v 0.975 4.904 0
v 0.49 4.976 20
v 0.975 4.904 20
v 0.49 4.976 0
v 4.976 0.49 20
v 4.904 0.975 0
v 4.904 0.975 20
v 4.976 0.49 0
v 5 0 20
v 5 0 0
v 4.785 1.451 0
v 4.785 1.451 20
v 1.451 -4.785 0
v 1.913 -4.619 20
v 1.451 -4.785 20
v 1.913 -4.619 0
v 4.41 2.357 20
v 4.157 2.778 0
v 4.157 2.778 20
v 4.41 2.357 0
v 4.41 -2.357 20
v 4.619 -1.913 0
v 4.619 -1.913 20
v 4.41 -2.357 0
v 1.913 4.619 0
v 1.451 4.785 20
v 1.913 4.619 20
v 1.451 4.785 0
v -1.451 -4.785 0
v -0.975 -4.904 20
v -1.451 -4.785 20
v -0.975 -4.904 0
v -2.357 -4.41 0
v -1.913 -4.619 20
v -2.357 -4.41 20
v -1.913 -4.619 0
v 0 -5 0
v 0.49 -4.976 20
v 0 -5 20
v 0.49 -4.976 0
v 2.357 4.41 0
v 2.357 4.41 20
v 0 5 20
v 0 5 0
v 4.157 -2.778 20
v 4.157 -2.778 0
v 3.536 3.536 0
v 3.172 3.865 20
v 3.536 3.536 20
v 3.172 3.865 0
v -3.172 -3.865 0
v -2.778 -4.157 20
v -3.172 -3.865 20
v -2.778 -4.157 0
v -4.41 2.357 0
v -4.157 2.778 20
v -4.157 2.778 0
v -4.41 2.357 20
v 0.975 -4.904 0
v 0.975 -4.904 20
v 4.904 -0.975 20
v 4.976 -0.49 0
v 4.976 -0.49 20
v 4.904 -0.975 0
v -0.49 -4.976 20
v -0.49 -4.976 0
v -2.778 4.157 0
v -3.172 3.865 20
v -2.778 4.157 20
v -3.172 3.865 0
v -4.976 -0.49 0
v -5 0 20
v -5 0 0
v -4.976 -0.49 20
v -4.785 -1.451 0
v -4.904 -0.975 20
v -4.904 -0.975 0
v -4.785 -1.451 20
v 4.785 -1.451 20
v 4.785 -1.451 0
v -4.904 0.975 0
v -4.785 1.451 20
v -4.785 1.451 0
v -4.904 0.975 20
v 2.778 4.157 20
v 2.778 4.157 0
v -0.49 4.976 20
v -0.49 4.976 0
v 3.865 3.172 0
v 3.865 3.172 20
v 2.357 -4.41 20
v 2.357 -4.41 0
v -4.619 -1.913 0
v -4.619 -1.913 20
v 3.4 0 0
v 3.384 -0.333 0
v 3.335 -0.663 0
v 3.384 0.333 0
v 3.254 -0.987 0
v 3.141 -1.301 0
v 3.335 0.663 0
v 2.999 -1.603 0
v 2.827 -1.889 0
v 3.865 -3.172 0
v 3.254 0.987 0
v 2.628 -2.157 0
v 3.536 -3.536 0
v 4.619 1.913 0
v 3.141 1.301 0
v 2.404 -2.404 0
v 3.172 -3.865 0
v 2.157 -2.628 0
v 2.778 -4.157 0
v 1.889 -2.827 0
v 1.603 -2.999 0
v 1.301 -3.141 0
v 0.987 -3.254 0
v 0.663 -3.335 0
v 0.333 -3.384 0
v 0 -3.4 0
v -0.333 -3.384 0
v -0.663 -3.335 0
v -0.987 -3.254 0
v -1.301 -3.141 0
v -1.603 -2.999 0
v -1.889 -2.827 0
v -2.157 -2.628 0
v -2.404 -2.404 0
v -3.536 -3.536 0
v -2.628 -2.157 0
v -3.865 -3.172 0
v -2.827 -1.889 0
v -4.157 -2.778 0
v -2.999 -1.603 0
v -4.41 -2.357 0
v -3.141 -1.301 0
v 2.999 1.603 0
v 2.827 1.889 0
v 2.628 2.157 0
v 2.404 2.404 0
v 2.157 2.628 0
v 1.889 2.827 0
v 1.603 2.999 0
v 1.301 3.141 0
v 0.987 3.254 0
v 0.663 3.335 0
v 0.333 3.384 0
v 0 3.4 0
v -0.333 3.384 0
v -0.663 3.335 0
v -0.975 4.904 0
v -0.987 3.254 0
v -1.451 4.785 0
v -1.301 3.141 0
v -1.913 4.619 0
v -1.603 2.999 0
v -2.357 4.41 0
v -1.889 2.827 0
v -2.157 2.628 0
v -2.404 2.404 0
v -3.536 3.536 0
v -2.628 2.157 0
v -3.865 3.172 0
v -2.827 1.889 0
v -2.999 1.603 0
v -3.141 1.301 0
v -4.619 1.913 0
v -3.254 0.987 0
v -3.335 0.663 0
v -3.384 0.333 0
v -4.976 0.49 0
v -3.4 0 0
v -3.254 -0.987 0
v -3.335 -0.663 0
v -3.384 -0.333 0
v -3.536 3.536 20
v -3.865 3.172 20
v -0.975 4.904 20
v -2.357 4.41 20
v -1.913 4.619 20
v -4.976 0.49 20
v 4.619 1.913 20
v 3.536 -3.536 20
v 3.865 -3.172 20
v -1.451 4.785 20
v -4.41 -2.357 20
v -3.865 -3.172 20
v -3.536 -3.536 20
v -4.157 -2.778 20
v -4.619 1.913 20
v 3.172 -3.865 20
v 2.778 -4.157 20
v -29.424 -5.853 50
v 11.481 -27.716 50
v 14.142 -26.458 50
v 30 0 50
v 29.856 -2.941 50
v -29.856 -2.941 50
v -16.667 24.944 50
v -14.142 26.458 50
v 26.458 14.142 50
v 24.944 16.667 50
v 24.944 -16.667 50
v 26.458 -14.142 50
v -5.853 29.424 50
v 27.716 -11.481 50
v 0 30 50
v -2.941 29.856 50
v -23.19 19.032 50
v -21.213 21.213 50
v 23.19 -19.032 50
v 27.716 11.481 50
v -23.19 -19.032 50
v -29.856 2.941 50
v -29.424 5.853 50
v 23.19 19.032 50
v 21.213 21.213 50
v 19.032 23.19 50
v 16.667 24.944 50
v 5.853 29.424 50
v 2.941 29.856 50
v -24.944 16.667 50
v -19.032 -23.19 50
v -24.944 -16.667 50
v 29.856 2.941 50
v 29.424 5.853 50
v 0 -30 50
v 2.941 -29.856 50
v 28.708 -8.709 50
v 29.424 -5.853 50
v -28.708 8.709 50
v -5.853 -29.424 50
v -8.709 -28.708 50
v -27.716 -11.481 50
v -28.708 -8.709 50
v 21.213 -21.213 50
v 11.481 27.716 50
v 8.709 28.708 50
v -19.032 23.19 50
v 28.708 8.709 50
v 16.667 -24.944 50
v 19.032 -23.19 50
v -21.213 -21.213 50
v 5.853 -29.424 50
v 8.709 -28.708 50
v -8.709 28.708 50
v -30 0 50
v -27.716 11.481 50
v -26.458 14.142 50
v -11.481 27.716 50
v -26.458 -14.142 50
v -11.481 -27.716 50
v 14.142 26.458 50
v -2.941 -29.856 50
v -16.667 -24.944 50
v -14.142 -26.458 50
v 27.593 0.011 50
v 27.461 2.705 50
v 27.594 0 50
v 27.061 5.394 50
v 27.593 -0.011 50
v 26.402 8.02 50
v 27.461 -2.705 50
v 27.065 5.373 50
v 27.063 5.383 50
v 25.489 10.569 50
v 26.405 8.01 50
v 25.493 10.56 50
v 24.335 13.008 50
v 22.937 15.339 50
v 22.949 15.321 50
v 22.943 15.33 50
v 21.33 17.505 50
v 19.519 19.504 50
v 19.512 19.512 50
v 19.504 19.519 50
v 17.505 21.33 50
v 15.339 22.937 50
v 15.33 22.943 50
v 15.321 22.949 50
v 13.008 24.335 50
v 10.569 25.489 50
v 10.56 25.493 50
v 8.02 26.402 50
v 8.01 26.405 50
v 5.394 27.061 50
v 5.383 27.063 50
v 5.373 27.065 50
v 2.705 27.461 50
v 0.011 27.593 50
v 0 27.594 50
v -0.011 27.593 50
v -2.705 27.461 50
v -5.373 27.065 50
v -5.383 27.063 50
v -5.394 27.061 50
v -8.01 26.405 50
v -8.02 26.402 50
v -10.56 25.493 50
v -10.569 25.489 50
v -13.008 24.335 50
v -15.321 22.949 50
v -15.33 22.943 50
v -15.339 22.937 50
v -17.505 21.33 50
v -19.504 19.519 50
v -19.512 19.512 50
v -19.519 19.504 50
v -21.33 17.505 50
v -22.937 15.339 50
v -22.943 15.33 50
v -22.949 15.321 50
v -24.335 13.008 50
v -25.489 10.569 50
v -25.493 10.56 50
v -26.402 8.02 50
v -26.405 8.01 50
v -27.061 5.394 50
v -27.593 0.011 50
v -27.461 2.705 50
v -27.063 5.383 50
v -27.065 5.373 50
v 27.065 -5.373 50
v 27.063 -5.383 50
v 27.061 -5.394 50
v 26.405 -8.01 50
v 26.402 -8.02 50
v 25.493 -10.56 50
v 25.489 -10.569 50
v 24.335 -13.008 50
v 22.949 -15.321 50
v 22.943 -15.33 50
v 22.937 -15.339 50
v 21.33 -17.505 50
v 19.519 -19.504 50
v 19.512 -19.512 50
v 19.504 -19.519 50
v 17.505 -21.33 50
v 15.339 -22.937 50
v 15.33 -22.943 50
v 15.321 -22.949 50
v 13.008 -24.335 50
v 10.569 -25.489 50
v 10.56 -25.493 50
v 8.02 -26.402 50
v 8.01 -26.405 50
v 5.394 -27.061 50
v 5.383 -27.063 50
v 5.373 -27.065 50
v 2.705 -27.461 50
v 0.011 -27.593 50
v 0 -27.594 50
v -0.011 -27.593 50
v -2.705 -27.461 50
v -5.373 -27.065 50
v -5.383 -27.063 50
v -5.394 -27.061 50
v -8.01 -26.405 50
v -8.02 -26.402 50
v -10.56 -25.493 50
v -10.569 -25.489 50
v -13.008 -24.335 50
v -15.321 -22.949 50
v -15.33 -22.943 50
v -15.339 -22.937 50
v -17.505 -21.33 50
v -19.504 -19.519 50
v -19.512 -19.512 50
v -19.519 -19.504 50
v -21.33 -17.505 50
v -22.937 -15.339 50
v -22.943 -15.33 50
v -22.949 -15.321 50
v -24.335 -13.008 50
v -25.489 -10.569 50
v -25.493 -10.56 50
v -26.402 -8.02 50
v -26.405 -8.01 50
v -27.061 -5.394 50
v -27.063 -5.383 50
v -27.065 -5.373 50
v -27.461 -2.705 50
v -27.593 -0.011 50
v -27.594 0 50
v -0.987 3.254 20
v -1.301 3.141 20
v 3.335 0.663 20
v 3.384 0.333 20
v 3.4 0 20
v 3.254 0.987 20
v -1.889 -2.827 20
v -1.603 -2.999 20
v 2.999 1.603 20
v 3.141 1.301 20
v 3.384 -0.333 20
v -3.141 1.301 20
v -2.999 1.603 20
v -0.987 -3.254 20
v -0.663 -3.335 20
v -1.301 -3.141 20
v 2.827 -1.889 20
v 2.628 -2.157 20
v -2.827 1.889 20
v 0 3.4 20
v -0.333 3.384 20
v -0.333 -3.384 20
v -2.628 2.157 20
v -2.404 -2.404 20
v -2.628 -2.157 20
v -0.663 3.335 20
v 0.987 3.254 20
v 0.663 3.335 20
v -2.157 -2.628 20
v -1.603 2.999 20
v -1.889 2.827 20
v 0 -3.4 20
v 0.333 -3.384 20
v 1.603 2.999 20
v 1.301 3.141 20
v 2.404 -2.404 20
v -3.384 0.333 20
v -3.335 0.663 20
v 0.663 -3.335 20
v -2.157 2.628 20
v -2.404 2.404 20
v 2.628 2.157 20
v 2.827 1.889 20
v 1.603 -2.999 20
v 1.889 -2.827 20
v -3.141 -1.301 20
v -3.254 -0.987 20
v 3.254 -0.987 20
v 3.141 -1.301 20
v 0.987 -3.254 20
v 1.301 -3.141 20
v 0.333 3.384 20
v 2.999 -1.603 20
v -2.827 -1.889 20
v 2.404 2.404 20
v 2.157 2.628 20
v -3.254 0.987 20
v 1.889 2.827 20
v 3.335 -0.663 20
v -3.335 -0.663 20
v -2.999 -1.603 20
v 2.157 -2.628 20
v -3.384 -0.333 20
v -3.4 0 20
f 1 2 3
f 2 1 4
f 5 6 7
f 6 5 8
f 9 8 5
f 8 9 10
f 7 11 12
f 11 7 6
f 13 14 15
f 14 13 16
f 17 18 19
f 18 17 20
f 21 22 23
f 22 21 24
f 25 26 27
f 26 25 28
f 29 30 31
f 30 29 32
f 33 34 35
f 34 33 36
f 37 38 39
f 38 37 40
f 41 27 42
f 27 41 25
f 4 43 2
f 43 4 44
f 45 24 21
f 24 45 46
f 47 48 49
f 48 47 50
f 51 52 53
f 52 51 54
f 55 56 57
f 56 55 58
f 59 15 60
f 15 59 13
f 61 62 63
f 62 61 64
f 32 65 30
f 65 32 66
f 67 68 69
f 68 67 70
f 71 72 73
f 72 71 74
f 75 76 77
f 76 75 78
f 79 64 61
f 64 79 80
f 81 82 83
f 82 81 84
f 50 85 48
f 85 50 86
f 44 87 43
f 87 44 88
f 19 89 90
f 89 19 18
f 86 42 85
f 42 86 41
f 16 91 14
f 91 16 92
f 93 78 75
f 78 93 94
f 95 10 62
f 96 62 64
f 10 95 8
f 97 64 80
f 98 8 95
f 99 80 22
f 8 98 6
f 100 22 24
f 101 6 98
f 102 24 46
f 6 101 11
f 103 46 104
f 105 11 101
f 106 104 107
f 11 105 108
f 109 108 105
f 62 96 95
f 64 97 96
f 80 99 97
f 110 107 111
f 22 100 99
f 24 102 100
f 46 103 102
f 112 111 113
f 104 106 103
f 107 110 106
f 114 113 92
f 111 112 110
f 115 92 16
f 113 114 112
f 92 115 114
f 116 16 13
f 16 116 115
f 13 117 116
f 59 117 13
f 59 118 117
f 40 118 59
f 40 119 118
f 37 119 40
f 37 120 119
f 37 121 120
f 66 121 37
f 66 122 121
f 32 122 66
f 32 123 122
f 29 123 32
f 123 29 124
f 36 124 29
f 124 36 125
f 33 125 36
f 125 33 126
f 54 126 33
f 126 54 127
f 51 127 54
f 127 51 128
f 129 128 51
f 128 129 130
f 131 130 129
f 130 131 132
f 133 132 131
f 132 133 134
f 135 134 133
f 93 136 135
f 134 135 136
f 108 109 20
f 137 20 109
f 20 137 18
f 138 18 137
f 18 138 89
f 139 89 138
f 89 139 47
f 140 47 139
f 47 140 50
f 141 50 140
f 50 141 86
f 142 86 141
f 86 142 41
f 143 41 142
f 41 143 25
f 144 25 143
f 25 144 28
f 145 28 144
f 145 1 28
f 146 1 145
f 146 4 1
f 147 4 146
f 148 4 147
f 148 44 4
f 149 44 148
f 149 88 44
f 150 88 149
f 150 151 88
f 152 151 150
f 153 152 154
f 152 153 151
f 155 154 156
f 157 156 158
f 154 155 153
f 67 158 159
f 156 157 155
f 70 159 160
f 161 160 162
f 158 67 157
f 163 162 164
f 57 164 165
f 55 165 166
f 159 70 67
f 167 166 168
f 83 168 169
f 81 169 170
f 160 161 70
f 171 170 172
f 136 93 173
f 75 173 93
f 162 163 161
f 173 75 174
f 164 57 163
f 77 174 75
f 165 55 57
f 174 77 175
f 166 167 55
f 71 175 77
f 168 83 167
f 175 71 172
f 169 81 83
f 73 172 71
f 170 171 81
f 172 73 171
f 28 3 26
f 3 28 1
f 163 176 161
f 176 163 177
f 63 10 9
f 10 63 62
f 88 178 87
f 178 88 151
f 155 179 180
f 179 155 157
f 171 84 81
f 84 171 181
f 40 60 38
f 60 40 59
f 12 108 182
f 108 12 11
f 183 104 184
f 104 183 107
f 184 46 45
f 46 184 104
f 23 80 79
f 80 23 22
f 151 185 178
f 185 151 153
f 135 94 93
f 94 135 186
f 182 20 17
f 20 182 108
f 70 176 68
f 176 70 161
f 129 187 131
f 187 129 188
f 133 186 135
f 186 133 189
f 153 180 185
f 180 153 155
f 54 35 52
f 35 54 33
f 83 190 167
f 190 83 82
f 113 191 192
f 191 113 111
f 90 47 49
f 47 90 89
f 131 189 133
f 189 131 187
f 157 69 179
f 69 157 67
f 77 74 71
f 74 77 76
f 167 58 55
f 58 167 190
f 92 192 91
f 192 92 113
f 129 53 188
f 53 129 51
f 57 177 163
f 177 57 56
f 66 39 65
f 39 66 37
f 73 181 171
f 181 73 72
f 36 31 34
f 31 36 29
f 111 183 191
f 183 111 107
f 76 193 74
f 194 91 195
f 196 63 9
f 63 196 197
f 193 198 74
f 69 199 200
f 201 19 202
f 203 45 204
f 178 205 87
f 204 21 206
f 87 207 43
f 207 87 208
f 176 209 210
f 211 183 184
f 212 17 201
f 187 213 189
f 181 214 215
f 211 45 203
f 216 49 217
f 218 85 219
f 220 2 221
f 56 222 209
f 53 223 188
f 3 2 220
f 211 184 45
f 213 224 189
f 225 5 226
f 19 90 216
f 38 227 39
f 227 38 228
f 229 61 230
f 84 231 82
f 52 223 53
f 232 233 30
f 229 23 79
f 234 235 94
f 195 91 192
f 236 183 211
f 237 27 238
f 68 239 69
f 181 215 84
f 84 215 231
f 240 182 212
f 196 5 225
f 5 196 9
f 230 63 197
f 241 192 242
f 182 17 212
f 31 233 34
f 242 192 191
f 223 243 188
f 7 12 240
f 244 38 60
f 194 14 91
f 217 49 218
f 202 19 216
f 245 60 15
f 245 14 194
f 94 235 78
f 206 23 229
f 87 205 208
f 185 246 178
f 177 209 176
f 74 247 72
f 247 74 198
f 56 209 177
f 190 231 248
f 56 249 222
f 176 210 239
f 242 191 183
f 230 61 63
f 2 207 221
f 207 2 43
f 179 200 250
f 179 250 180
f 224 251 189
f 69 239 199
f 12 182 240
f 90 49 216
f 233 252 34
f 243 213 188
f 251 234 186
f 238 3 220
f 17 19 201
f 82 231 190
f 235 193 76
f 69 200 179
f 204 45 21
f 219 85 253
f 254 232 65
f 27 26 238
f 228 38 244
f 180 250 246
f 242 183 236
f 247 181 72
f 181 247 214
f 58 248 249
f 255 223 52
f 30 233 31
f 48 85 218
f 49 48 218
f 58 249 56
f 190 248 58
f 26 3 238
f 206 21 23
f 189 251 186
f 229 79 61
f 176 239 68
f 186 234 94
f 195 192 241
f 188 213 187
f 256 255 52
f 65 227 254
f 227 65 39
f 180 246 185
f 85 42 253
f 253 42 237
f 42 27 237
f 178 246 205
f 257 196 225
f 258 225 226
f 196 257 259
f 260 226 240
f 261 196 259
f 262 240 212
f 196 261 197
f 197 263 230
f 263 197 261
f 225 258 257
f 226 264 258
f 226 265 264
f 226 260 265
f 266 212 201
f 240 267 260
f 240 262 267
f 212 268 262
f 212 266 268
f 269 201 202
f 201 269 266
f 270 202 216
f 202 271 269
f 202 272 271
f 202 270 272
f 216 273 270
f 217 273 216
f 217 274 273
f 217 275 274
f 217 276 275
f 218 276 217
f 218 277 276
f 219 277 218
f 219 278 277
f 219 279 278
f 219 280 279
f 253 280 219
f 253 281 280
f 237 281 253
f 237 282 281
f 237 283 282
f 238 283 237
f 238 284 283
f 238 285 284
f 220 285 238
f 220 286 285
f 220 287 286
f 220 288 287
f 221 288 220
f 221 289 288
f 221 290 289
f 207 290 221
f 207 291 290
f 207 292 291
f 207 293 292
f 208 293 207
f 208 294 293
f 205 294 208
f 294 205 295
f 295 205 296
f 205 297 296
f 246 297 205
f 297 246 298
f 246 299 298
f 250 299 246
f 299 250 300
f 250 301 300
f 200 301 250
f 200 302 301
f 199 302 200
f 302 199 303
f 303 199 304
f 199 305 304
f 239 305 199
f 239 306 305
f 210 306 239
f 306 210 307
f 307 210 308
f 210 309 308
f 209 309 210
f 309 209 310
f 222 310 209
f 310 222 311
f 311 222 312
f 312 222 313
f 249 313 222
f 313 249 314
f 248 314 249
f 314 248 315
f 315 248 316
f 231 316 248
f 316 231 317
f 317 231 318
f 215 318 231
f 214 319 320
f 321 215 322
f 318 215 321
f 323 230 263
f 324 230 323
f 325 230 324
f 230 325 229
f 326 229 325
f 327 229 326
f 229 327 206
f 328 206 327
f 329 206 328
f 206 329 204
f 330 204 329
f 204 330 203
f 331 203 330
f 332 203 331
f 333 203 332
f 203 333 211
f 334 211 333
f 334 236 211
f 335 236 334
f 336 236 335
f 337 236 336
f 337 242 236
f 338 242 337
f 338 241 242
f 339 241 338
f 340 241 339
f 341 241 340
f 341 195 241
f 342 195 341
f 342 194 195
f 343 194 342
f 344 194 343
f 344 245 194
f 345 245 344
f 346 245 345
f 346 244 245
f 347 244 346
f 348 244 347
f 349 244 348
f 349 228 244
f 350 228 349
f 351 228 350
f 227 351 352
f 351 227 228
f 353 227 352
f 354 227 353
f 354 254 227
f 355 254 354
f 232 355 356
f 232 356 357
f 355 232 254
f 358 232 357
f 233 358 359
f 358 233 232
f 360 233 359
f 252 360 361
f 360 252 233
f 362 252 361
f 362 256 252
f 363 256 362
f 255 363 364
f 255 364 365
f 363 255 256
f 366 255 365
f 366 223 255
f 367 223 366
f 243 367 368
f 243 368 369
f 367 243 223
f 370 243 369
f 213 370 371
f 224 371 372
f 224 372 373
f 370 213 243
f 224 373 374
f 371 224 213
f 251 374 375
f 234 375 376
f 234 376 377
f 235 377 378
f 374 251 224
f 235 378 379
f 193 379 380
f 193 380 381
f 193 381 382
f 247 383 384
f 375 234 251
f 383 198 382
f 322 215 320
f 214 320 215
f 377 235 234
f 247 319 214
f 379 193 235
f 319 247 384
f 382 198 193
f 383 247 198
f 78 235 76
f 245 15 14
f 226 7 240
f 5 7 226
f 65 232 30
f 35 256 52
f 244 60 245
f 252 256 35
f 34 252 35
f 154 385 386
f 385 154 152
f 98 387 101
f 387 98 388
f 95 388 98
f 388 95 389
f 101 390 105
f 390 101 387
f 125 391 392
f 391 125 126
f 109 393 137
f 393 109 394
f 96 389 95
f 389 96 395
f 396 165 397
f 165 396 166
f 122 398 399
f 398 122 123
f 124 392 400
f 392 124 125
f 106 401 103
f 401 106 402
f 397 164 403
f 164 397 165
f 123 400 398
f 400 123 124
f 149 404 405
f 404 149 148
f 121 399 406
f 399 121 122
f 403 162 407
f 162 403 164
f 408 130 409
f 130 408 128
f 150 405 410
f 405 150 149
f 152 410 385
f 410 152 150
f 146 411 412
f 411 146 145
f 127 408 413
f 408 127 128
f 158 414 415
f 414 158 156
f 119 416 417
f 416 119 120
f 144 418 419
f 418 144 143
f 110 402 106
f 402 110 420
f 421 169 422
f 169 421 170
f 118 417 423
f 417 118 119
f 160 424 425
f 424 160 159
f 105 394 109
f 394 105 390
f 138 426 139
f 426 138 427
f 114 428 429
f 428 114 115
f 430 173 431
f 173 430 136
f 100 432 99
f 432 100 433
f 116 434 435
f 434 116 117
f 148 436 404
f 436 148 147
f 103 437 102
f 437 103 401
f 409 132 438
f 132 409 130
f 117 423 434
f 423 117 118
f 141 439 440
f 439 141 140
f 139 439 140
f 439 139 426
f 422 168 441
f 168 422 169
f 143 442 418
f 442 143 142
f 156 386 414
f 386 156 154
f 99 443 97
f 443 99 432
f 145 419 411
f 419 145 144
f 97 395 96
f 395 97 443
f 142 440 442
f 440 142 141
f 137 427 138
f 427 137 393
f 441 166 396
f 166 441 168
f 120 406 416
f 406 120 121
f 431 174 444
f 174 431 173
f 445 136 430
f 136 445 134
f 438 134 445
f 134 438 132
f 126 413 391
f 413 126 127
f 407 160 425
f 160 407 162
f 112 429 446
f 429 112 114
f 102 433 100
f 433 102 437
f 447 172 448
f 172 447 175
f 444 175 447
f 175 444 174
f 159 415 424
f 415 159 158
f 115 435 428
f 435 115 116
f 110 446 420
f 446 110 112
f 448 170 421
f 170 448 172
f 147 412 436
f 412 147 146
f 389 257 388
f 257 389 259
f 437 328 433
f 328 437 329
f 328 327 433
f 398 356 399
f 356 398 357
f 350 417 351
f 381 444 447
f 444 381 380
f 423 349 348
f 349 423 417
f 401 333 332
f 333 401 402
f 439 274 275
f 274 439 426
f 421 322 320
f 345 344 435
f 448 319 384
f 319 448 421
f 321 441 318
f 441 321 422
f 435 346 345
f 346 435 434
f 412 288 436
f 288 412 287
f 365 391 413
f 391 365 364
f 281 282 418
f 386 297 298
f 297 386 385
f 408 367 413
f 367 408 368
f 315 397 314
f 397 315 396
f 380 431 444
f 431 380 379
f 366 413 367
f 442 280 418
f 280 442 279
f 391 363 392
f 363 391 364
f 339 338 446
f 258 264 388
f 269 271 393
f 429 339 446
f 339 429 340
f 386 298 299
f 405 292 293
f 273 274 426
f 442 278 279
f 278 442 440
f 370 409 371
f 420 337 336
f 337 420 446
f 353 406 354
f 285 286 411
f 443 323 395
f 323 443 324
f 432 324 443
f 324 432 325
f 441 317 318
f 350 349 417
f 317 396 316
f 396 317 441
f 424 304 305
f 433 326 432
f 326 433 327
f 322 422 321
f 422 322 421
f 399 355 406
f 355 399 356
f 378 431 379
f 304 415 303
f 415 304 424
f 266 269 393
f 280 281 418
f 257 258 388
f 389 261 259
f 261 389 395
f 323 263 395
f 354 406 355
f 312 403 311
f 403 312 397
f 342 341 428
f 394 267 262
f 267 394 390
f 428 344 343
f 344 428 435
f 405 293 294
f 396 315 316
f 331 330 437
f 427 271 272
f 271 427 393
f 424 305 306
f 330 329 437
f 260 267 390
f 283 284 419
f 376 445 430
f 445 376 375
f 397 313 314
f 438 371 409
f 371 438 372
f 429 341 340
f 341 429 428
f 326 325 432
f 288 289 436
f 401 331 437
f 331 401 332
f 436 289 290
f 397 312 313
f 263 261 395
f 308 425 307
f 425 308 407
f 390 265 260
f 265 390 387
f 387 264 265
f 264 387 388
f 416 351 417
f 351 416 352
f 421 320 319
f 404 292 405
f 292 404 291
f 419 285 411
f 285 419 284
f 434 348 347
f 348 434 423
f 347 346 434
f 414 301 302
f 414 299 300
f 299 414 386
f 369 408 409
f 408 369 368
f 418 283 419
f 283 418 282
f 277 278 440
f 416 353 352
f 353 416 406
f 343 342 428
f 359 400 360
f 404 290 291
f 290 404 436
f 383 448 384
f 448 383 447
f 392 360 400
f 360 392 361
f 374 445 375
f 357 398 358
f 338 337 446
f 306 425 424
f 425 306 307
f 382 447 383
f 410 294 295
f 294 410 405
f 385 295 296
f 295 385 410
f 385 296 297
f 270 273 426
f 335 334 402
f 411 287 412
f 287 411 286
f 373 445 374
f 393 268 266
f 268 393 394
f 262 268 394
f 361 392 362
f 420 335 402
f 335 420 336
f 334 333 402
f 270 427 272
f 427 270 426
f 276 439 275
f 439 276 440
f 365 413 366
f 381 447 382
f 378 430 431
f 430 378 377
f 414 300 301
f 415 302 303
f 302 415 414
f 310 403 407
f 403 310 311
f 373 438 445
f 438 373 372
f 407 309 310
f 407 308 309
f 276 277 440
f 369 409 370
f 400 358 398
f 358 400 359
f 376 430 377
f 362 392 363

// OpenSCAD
$fn = 64;

// Spout dimensions
SPOUT_OD = 10;        // Outer diameter of the straight tube
SPOUT_H = 20;         // Height of the straight tube

// Cone dimensions
CONE_BOT_OD = 10;     // Outer diameter at the base of the cone (z=20)
CONE_TOP_OD = 60;     // Outer diameter at the rim (z=50)
CONE_H = 30;          // Height of the cone section

// Wall thickness
WALL = 1.6;           // Uniform wall thickness

// Derived radii
SPOUT_R = SPOUT_OD / 2;
SPOUT_IR = SPOUT_R - WALL;
CONE_BOT_R = CONE_BOT_OD / 2;
CONE_TOP_R = CONE_TOP_OD / 2;
CONE_BOT_IR = CONE_BOT_R - WALL;
CONE_TOP_IR = CONE_TOP_R - WALL;

difference() {
    union() {
        cylinder(r = SPOUT_R, h = SPOUT_H);
        translate([0, 0, SPOUT_H]) {
            cylinder(r1 = CONE_BOT_R, r2 = CONE_TOP_R, h = CONE_H);
        }
    }
    union() {
        translate([0, 0, -0.5]) {
            cylinder(r = SPOUT_IR, h = SPOUT_H + 1);
        }
        translate([0, 0, SPOUT_H]) {
            cylinder(r1 = CONE_BOT_IR, r2 = CONE_TOP_IR, h = CONE_H + 1);
        }
    }
}
